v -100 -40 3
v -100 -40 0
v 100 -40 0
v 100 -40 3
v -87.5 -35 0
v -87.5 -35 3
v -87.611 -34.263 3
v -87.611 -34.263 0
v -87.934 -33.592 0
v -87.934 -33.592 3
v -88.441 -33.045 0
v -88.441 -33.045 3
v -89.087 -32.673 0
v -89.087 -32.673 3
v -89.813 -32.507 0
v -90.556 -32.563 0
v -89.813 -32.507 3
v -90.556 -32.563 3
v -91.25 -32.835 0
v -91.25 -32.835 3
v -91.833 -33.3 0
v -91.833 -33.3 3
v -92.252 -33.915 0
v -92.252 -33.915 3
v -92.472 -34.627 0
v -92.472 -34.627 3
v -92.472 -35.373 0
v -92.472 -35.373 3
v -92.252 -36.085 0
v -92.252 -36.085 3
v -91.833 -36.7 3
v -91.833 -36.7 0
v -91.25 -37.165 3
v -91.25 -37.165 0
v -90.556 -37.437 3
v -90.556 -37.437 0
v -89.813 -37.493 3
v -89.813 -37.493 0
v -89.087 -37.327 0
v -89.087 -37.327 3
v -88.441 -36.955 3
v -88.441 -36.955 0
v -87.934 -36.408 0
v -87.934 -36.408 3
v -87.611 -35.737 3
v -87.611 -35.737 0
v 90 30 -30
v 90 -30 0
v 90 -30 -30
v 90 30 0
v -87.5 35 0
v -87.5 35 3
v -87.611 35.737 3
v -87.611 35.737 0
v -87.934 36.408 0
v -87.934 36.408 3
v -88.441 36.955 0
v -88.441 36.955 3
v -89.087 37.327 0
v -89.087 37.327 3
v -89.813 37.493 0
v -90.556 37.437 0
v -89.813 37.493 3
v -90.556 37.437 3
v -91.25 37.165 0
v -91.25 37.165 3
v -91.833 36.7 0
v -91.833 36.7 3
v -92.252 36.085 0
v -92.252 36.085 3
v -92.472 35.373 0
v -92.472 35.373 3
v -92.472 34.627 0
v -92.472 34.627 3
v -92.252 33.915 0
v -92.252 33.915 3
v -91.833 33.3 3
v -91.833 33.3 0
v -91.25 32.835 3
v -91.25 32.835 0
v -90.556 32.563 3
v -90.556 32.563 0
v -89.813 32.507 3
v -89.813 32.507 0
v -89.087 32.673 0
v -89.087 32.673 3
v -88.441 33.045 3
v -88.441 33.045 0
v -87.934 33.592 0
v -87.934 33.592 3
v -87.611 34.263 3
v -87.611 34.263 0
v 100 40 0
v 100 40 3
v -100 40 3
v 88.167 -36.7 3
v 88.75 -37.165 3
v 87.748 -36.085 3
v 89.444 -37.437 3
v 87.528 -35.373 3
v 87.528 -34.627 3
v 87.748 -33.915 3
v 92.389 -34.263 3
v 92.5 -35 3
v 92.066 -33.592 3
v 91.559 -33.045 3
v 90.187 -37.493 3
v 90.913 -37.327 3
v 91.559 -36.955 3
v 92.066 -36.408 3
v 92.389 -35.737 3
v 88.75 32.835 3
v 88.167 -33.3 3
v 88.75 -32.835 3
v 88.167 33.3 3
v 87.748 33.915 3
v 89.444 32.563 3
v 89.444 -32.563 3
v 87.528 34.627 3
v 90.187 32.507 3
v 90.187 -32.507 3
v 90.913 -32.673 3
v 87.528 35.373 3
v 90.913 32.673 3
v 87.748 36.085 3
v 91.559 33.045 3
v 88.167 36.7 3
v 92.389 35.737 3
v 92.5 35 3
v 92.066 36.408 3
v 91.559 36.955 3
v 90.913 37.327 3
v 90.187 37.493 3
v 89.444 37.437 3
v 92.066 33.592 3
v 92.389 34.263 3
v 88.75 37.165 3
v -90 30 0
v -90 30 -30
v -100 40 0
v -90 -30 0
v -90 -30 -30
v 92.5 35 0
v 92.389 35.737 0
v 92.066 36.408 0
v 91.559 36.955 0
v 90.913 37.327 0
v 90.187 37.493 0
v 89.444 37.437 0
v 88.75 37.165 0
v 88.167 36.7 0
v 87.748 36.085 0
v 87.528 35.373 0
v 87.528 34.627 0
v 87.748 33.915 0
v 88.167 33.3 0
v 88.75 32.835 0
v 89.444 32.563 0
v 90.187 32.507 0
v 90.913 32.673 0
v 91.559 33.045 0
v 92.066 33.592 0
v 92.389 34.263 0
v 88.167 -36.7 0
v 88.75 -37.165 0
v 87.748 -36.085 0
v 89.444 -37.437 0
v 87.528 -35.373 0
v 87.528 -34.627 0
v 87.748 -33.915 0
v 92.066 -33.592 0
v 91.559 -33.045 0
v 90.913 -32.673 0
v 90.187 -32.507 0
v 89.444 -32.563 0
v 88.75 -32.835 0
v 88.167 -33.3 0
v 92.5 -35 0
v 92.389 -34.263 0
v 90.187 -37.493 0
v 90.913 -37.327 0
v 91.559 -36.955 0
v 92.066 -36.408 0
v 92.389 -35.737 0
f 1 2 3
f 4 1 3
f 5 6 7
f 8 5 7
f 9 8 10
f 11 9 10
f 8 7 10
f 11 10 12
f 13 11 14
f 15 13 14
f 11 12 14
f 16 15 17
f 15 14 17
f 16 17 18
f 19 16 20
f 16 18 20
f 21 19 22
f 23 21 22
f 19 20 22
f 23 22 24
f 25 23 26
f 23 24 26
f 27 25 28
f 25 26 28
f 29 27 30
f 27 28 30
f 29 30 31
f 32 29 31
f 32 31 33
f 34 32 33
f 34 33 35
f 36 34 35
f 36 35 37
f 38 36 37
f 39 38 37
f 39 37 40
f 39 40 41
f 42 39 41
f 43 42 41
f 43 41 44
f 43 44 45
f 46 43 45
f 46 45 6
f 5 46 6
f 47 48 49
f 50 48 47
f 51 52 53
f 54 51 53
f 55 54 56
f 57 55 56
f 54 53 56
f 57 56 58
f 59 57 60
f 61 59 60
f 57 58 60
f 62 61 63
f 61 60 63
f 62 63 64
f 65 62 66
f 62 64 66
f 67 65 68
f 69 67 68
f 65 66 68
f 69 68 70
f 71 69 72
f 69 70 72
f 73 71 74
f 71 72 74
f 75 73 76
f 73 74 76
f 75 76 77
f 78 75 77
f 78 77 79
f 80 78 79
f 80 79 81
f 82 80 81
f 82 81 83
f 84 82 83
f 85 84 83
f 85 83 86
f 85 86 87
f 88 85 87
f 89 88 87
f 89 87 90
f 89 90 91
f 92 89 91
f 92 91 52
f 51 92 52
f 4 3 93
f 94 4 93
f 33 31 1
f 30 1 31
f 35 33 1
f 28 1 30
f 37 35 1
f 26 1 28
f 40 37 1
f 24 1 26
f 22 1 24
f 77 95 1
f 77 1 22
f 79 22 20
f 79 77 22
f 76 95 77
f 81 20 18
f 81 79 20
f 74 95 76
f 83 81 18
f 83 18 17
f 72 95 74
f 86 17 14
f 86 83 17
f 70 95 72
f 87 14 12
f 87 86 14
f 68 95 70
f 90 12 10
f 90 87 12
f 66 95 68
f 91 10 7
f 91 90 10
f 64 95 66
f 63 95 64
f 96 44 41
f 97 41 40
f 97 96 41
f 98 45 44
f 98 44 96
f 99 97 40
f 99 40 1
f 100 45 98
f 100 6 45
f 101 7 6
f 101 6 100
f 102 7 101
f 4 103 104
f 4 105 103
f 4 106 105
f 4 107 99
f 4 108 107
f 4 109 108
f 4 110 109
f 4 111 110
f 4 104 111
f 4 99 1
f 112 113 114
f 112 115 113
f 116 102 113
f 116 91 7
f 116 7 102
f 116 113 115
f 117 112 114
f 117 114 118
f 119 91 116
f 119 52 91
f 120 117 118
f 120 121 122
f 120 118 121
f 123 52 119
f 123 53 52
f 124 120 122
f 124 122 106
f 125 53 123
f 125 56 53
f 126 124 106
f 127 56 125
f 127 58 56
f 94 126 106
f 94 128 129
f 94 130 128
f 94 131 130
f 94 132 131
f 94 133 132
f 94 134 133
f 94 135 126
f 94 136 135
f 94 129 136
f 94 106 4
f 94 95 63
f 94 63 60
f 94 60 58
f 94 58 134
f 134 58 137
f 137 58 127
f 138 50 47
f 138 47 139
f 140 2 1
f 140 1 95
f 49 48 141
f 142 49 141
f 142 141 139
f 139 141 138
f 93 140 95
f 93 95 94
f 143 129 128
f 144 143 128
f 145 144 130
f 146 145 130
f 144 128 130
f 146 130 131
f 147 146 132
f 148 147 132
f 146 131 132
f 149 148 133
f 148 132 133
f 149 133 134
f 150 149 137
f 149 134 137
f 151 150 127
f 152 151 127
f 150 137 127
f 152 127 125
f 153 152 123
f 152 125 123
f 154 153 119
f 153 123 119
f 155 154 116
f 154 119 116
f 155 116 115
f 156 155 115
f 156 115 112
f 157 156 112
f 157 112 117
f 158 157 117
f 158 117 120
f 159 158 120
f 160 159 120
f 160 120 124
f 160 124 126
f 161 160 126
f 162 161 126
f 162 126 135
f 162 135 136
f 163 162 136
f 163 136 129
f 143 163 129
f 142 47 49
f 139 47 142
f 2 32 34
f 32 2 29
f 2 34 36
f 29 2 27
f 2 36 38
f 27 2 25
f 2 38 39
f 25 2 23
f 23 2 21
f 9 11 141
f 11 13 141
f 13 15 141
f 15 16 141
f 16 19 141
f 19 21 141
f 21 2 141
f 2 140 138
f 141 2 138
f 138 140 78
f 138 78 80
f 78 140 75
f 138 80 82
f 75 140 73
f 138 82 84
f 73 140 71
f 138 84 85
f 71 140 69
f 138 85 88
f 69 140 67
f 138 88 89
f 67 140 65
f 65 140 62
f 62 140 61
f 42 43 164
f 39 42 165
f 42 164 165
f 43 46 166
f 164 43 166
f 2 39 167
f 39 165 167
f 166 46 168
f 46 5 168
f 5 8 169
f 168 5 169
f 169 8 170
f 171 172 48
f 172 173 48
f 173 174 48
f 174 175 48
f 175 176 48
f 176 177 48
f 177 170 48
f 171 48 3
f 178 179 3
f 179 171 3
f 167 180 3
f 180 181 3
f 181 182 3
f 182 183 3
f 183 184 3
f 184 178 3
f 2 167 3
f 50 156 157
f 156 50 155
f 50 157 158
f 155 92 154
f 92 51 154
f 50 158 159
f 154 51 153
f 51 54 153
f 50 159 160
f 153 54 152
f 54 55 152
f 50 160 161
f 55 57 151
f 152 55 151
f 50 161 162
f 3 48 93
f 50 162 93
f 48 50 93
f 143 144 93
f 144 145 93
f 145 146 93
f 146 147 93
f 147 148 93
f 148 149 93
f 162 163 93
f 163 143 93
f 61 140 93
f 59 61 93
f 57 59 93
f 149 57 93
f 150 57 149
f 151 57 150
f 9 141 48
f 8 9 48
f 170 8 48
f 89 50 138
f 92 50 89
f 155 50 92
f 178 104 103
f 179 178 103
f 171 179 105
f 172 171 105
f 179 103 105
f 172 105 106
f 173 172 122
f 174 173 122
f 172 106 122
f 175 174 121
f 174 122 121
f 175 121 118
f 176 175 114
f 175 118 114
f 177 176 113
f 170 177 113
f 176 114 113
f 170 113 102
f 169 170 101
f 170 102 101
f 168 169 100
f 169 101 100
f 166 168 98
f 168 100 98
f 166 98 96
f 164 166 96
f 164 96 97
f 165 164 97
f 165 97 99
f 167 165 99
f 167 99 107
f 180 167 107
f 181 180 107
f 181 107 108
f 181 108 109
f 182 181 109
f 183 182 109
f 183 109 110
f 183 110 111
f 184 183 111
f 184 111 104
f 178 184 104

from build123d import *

# Parameters (mm, degrees)
SKETCH_1_W             = 200
SKETCH_1_H             = 80
EXTRUDE_1_DEPTH        = 3
SKETCH_2_W             = 180
SKETCH_2_H             = 60
EXTRUDE_2_DEPTH        = 30
HOLE_WIZARD_M6_1_D     = 5
HOLE_WIZARD_M6_1_DEPTH = 15
HOLE_WIZARD_M6_1_TIP   = 1.502151548


with BuildPart() as part:
    # 草图1 → 凸台-拉伸1 (new body)
    with BuildSketch(Plane.XY):
        Rectangle(SKETCH_1_W, SKETCH_1_H)
    extrude(amount=EXTRUDE_1_DEPTH)

    # 草图2 → 凸台-拉伸2 (add)
    with BuildSketch(Plane(origin=(0, 0, 0), x_dir=(-1, 0, 0), z_dir=(0, 0, -1))):
        Rectangle(SKETCH_2_W, SKETCH_2_H)
    extrude(amount=EXTRUDE_2_DEPTH)

    # M6 螺纹孔1
    with Locations(Plane(origin=(0, 0, 0), x_dir=(-1, 0, 0), z_dir=(0, 0, -1))):
        with Locations((-90, 35), (-90, -35), (90, -35), (90, 35)):
            Hole(HOLE_WIZARD_M6_1_D / 2, depth=HOLE_WIZARD_M6_1_DEPTH)
            with Locations((0, 0, -(HOLE_WIZARD_M6_1_DEPTH + HOLE_WIZARD_M6_1_TIP / 2))):  # 118° drill point
                Cone(0, HOLE_WIZARD_M6_1_D / 2, HOLE_WIZARD_M6_1_TIP, mode=Mode.SUBTRACT)


solid = part.part
